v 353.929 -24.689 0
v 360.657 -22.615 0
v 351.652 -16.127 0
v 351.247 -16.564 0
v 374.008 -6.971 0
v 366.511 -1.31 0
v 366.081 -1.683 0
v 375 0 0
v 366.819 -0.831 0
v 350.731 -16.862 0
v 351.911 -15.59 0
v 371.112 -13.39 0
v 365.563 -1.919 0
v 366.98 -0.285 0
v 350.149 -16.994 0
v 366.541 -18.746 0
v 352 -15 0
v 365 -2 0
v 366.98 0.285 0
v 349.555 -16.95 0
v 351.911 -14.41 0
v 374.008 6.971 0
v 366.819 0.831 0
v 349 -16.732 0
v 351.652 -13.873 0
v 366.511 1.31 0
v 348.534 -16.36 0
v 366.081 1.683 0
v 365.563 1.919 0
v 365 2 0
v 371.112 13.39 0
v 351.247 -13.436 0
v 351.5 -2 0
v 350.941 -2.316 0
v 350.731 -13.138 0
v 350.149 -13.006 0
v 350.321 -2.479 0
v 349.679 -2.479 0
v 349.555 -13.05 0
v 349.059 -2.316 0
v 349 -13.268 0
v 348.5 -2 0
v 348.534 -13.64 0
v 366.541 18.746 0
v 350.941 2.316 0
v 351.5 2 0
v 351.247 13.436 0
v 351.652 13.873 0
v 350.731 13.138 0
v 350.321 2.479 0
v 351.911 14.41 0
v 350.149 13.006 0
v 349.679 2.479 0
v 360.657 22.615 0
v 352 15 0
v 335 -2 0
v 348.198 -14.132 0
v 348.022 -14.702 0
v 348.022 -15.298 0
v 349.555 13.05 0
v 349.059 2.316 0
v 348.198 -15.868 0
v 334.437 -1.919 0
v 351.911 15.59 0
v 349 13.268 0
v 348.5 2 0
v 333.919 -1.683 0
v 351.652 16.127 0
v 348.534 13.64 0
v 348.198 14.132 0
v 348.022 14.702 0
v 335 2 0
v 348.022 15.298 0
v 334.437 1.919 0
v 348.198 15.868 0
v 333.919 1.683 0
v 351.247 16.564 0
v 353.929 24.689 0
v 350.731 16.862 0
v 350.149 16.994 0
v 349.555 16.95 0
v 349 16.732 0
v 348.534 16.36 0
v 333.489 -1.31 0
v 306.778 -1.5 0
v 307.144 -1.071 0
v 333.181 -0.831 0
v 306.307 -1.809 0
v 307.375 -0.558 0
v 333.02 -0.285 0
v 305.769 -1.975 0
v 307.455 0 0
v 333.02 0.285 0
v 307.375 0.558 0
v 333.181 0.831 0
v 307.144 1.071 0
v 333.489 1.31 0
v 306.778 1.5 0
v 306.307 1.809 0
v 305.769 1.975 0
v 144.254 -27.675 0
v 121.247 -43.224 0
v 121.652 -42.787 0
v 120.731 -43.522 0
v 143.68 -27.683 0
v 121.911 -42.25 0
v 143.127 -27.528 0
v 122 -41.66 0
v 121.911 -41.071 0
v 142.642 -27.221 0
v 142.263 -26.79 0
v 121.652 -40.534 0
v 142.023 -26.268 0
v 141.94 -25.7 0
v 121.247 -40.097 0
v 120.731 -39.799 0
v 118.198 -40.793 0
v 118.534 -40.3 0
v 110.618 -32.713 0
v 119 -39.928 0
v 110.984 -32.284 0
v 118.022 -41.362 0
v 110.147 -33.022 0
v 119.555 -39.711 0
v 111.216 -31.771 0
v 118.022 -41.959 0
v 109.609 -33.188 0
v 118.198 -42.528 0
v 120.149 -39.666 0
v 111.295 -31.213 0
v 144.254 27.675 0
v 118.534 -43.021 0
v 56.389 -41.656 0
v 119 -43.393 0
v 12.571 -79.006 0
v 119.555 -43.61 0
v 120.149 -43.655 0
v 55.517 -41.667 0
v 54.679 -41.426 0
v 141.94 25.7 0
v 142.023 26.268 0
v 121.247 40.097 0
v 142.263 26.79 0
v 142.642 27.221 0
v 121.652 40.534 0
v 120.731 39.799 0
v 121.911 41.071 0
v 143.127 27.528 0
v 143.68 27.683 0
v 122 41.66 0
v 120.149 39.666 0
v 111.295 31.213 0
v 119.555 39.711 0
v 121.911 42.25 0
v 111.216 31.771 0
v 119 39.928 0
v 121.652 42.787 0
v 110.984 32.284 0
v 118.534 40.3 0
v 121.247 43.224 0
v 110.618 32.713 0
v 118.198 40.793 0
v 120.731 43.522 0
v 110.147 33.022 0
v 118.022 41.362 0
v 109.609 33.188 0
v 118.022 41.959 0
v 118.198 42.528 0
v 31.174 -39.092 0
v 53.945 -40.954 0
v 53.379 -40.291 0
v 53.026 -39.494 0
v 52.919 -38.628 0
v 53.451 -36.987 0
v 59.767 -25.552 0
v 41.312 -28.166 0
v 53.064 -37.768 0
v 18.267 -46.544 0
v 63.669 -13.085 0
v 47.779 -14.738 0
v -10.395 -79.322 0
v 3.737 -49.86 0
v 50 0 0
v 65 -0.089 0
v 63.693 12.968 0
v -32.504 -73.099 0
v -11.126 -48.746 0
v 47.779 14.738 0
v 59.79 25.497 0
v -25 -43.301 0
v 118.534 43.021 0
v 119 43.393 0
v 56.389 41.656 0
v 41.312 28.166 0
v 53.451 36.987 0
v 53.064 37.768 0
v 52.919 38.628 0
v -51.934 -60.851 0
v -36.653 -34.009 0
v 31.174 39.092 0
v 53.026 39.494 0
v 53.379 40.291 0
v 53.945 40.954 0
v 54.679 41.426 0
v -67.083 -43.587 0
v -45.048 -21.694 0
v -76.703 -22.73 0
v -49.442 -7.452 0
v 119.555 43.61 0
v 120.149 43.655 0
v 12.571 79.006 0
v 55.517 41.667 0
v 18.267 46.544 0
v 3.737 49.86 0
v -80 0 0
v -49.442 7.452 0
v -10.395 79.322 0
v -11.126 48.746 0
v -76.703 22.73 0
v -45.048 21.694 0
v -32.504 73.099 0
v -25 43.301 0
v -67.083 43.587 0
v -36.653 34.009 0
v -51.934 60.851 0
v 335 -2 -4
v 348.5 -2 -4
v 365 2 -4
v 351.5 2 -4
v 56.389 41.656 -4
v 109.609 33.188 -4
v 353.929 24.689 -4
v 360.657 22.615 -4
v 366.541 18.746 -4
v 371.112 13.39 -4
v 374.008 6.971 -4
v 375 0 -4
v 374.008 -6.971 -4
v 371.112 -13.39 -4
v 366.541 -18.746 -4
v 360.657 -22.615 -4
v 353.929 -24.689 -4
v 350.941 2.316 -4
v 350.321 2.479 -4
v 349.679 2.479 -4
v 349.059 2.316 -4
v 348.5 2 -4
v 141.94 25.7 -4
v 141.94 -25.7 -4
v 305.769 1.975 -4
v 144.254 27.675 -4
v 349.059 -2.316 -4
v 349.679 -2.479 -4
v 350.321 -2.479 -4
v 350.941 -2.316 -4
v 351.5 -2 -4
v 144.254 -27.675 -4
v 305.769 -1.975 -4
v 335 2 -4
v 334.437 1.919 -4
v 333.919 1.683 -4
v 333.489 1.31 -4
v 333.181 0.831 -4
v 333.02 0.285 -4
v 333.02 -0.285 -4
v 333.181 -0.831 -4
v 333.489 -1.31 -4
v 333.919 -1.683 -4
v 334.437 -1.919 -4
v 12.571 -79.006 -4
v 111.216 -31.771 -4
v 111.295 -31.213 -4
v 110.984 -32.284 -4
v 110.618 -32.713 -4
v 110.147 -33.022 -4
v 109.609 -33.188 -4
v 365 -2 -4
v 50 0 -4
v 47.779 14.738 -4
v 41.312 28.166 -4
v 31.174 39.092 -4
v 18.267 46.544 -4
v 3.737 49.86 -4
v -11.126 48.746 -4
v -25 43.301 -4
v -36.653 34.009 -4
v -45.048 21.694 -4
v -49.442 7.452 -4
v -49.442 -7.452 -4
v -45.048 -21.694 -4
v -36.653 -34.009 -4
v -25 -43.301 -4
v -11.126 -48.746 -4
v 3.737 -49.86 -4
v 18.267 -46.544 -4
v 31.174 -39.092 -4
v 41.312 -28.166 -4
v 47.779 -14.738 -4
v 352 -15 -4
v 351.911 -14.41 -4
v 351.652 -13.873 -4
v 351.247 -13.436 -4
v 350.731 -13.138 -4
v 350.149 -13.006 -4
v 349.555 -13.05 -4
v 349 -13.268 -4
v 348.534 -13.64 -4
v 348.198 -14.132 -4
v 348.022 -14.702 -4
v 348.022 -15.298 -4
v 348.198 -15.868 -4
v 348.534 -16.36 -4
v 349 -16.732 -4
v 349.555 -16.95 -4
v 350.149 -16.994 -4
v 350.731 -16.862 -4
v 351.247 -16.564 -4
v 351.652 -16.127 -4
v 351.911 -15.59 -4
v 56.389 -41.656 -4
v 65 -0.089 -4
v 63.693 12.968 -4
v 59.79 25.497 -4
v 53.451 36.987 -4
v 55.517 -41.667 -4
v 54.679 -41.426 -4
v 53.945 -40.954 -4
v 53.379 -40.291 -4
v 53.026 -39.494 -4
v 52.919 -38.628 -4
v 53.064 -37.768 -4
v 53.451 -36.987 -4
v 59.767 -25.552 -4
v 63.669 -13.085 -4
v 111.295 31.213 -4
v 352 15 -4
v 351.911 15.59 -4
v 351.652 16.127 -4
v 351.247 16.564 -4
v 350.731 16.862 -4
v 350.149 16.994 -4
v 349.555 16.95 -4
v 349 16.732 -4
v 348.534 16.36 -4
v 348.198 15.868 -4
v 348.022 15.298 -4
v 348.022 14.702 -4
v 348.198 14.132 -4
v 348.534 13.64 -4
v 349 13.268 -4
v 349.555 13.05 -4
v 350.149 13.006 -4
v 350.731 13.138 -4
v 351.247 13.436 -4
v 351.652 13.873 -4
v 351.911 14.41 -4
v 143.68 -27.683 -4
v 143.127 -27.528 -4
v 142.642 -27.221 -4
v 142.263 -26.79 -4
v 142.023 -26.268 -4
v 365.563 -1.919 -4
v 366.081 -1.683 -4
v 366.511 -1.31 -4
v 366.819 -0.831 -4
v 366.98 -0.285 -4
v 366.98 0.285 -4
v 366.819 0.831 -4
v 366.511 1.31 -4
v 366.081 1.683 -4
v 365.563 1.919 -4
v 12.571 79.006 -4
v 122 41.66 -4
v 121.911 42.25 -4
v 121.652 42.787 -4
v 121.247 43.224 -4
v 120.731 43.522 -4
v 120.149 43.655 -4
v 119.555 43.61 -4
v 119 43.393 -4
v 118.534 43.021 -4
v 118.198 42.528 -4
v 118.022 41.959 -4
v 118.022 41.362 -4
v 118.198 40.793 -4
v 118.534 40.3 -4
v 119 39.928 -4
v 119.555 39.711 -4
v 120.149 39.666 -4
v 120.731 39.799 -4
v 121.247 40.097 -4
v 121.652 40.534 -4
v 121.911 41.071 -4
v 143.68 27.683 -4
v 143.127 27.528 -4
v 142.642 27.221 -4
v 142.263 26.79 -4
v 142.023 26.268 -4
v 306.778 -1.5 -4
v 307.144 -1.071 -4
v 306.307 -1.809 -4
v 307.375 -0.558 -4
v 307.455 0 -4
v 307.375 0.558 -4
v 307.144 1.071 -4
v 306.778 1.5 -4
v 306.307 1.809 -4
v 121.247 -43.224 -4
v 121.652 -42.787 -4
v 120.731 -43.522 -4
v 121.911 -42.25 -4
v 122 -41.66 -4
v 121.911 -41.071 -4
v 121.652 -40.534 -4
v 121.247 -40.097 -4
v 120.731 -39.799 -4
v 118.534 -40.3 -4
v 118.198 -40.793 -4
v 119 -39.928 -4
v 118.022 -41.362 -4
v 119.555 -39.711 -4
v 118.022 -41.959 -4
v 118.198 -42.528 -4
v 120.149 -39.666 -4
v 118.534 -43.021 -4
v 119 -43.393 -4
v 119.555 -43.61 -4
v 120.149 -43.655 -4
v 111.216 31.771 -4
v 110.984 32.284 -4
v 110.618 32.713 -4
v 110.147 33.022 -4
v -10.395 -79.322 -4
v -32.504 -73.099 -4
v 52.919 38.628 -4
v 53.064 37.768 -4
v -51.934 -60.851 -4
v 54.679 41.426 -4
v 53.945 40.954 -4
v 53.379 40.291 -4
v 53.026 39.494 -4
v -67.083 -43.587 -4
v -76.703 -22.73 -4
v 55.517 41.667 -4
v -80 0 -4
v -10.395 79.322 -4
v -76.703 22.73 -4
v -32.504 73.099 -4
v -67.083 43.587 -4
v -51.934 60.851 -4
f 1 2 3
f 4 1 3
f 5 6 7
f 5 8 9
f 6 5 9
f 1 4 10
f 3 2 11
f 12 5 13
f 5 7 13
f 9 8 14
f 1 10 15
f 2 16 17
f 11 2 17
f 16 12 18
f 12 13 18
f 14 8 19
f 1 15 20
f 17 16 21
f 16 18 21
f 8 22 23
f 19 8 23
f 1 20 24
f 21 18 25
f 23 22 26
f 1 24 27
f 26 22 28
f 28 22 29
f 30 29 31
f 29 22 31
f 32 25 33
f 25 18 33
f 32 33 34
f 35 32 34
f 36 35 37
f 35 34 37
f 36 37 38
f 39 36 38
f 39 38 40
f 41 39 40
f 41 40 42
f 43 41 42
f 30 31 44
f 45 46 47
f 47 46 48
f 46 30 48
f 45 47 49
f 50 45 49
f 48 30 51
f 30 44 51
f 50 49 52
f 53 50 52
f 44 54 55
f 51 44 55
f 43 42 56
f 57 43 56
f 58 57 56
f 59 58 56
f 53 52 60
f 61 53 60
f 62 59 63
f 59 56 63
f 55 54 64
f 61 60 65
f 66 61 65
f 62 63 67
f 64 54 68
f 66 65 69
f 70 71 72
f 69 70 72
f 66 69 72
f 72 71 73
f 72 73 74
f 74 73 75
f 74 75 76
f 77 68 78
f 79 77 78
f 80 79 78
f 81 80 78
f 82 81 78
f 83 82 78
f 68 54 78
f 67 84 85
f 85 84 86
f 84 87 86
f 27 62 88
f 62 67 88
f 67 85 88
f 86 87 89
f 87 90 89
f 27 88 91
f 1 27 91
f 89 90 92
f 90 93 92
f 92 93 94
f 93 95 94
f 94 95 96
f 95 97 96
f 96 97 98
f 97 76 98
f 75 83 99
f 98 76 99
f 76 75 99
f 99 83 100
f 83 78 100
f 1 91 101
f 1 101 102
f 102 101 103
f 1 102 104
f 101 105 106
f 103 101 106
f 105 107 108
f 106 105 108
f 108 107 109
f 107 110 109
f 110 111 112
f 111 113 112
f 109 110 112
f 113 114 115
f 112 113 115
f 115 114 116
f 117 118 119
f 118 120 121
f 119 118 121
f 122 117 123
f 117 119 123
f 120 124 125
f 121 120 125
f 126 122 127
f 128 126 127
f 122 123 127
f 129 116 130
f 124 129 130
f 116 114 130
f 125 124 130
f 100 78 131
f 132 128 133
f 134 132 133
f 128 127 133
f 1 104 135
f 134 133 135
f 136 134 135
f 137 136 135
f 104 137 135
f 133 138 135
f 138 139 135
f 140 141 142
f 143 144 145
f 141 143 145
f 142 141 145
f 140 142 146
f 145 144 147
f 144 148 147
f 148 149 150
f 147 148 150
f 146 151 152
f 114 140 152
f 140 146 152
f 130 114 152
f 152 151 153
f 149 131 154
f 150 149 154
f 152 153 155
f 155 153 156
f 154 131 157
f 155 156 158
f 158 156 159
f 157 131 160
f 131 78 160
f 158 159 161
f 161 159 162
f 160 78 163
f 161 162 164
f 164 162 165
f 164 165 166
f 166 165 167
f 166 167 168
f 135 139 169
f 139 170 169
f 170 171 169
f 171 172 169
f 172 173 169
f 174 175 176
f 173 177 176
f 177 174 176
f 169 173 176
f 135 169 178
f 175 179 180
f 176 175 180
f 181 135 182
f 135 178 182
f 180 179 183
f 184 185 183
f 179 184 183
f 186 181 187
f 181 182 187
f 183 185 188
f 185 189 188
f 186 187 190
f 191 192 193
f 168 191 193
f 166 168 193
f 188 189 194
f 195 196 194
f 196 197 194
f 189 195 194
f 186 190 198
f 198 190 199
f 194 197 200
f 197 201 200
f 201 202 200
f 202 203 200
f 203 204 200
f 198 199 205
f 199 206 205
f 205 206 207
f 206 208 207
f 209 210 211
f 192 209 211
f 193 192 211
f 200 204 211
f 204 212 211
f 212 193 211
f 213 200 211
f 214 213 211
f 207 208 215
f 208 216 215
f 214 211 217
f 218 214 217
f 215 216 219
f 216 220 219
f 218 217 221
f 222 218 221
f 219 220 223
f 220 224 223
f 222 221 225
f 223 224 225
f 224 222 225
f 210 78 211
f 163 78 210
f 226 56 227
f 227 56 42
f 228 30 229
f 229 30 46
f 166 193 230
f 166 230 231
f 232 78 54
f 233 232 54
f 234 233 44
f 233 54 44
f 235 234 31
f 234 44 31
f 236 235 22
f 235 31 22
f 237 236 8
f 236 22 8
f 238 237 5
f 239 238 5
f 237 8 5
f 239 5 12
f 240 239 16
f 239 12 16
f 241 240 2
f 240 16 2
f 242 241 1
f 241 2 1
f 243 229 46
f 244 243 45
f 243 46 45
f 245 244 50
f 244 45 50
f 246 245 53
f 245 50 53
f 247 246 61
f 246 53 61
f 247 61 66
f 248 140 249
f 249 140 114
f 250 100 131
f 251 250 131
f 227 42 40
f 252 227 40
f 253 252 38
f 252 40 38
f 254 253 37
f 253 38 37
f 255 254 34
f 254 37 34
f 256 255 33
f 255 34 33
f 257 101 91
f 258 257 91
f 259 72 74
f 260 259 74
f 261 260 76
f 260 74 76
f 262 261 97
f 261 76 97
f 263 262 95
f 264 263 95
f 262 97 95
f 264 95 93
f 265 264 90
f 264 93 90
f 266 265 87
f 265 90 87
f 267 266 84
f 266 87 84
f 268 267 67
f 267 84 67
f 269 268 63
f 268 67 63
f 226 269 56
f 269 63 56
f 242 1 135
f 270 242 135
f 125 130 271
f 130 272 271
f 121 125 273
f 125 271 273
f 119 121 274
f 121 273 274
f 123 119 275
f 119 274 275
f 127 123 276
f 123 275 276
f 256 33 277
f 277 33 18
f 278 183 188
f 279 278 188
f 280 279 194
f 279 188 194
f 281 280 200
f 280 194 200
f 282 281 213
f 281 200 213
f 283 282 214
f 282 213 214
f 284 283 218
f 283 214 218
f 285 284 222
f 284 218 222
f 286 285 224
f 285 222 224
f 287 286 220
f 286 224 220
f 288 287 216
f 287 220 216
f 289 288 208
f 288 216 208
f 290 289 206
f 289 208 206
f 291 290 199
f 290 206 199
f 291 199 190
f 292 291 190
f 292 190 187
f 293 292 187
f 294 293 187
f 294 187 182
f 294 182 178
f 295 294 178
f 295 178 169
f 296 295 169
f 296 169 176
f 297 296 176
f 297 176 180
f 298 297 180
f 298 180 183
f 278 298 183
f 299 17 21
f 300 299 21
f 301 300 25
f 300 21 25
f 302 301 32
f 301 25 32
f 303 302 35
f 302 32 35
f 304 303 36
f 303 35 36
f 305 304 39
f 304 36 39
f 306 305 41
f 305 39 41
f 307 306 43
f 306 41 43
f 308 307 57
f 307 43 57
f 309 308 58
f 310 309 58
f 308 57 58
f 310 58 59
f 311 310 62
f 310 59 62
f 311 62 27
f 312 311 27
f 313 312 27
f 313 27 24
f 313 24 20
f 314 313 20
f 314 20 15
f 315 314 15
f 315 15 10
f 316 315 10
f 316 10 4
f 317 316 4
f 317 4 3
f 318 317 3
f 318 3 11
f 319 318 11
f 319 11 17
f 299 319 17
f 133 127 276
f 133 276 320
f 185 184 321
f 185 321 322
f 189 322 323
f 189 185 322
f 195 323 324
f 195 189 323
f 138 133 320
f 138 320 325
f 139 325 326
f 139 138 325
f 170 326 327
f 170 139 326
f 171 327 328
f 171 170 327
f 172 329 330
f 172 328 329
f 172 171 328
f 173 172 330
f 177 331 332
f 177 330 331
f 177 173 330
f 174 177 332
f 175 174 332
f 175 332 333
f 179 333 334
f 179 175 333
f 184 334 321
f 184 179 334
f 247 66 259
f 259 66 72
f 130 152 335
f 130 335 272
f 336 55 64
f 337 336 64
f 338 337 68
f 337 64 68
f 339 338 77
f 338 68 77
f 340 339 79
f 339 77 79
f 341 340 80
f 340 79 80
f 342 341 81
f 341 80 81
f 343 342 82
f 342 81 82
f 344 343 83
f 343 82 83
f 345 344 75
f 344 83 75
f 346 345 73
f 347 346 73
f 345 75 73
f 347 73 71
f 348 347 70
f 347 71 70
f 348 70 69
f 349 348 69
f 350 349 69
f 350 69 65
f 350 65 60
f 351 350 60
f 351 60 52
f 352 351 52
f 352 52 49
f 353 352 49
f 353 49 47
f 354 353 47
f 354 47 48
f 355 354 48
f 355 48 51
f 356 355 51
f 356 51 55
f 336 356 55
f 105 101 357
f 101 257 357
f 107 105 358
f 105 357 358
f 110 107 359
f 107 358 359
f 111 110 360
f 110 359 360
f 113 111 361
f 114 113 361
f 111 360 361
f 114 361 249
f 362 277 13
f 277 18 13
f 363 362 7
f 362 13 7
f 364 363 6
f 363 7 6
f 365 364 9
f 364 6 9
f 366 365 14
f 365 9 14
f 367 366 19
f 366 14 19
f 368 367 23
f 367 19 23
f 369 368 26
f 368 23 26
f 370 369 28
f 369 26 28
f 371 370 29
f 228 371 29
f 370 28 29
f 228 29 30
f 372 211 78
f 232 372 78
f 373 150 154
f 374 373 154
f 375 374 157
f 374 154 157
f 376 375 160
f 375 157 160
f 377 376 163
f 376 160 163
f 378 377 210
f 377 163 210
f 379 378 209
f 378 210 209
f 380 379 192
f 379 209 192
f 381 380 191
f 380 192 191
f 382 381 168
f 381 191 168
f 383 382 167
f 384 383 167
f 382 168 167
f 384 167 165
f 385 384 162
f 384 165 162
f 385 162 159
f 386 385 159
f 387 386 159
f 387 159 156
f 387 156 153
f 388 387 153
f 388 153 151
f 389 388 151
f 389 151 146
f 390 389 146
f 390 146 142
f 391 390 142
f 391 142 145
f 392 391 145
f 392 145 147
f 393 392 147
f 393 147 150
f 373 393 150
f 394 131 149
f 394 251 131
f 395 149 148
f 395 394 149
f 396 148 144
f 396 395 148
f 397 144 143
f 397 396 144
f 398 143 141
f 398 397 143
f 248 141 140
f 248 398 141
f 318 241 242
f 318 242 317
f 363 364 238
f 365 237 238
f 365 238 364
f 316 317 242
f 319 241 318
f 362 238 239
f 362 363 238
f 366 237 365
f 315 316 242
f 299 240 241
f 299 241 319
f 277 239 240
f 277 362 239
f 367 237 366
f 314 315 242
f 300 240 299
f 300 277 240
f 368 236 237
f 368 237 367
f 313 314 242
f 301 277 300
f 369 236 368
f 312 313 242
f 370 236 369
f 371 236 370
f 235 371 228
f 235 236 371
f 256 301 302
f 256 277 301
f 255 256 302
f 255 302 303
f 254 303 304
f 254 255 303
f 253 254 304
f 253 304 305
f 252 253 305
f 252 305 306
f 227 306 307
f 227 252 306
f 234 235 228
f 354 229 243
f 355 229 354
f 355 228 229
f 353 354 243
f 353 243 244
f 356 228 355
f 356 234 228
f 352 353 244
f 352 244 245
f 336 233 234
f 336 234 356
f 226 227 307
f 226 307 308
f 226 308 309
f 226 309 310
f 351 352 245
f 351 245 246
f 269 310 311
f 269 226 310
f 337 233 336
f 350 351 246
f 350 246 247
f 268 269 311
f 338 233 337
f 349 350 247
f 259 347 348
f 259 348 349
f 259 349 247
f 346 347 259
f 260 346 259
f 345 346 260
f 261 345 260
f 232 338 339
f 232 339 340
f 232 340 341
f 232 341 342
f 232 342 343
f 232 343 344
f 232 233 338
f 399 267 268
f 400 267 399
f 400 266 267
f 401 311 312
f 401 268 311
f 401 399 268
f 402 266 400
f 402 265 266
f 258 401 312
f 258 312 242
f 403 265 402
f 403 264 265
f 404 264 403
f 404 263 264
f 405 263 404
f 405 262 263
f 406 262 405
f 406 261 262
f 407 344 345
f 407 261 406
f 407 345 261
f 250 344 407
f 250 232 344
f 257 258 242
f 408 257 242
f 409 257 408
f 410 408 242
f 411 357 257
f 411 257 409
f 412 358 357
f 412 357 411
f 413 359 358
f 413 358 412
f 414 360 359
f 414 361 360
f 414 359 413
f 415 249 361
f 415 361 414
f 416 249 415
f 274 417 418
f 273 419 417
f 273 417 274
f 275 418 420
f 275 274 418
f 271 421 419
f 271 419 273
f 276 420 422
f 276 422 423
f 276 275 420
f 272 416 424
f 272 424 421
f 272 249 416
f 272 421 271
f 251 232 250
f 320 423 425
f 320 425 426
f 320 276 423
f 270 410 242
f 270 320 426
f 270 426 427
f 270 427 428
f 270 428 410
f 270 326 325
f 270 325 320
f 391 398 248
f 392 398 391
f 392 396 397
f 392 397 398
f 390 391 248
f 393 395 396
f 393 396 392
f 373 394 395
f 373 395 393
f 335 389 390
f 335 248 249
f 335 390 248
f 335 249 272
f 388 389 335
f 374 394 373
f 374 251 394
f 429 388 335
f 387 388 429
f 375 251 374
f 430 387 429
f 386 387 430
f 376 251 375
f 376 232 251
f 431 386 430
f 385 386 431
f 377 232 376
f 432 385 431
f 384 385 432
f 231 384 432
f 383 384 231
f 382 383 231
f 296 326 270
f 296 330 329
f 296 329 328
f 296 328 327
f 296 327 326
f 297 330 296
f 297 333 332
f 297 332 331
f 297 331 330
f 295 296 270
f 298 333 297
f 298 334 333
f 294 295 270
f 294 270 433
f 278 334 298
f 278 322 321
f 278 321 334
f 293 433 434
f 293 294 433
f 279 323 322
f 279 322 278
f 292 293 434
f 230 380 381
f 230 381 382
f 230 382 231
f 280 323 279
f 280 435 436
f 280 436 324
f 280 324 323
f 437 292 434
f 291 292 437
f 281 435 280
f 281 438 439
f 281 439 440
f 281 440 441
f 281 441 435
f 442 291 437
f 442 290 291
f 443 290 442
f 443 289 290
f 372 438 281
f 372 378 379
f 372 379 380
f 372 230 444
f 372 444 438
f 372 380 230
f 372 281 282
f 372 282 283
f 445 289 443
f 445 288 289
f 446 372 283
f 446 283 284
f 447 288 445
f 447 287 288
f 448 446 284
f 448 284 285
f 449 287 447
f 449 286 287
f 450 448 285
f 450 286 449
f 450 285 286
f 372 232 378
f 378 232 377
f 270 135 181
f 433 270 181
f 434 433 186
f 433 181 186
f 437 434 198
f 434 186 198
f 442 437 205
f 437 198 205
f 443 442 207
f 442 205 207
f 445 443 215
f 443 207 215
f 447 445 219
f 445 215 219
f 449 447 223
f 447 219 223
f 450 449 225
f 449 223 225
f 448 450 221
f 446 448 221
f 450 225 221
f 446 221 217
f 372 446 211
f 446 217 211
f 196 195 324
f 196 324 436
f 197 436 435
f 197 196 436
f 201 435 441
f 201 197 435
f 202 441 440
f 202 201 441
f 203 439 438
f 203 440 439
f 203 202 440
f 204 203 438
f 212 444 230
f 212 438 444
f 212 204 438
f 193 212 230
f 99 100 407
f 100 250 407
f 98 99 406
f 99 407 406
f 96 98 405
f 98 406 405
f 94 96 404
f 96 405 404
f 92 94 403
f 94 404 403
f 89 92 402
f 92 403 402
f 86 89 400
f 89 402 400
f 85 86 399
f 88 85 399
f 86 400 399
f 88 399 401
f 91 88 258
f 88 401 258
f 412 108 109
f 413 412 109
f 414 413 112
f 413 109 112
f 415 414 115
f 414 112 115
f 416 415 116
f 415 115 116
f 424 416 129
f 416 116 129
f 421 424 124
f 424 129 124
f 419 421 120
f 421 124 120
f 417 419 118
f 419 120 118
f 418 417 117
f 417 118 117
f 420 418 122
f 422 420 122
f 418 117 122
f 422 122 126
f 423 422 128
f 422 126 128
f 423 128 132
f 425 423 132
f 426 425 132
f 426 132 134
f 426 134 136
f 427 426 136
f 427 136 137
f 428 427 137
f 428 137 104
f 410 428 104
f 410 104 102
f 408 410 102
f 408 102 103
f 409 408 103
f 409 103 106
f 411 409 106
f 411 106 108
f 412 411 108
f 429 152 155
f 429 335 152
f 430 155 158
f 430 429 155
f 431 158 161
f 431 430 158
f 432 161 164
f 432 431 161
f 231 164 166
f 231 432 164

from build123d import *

# Parameters (mm, degrees)
SM_BASE_FLANGE_1_DEPTH = 4
SKETCH_6_R             = 20
SKETCH_6_R_2           = 2.5
CUT_EXTRUDE_1_DEPTH    = 10
SKETCH_7_R             = 2
CUT_EXTRUDE_2_DEPTH    = 10
CUT_EXTRUDE_3_DEPTH    = 10
SKETCH_9_R             = 2
CUT_EXTRUDE_4_DEPTH    = 80
FILLET_2_R             = 2
SKETCH_10_R            = 50
CUT_EXTRUDE_5_DEPTH    = 10


# Sheet-metal steps are written as plain solids
with BuildPart() as part:
    # Sketch 1 → 基体-法兰1 (new body)
    with BuildSketch(Plane.XY):
        with BuildLine():
            Line((12.571428571, 79.00607055), (353.928571429, 24.689397047))
            ThreePointArc((353.928571429, 24.689397047), (375, 0), (353.928571429, -24.689397047))
            Line((353.928571429, -24.689397047), (12.571428571, -79.00607055))
            ThreePointArc((12.571428571, -79.00607055), (-80, 0), (12.571428571, 79.00607055))
        make_face()
    extrude(amount=-SM_BASE_FLANGE_1_DEPTH)

    # 草图6 → 切除-拉伸1 (cut)
    with BuildSketch(Plane.XY):
        Circle(SKETCH_6_R)
        with Locations((350, 0)):
            Circle(SKETCH_6_R_2)
    extrude(amount=-CUT_EXTRUDE_1_DEPTH, mode=Mode.SUBTRACT)

    # 草图7 → 切除-拉伸2 (cut)
    with BuildSketch(Plane.XY):
        with Locations((365, 0)):
            Circle(SKETCH_7_R)
        with Locations((350, -15)):
            Circle(SKETCH_7_R)
        with Locations((335, 0)):
            Circle(SKETCH_7_R)
        with Locations((350, 15)):
            Circle(SKETCH_7_R)
        with BuildLine():
            Line((111.294862901, 32.919806827), (111.294862901, -32.919806827))
            Line((111.294862901, -32.919806827), (56.389238276, -41.656377743))
            ThreePointArc((56.389238276, -41.656377743), (53.378656764, -40.291367953), (53.450847511, -36.986577299))
            ThreePointArc((53.450847511, -36.986577299), (62.032293151, -19.416348946), (64.999939097, -0.088979461))
            ThreePointArc((64.999939097, -0.088979461), (62.058814357, 19.33141383), (53.450847511, 36.986577299))
            ThreePointArc((53.450847511, 36.986577299), (53.378656764, 40.291367953), (56.389238276, 41.656377743))
            Line((56.389238276, 41.656377743), (111.294862901, 32.919806827))
        make_face()
        Polygon((141.940088648, 28.043545246), (141.940088648, -28.043545246), (318.181818182, 0), align=None)
    extrude(amount=-CUT_EXTRUDE_2_DEPTH, mode=Mode.SUBTRACT)

    # 草图8 → 切除-拉伸3 (cut)
    with BuildSketch(Plane.XY):
        with BuildLine():
            Line((347.5, 0), (337, 0))
            ThreePointArc((337, 0), (336.414213562, -1.414213562), (335, -2))
            Line((335, -2), (348.5, -2))
            ThreePointArc((348.5, -2), (347.763932023, -1.118033989), (347.5, 0))
        make_face()
        with BuildLine():
            ThreePointArc((335, 2), (336.414213562, 1.414213562), (337, 0))
            Line((337, 0), (347.5, 0))
            ThreePointArc((347.5, 0), (347.763932023, 1.118033989), (348.5, 2))
            Line((348.5, 2), (335, 2))
        make_face()
        with BuildLine():
            ThreePointArc((351.5, 2), (352.236067977, 1.118033989), (352.5, 0))
            Line((352.5, 0), (363, 0))
            ThreePointArc((363, 0), (363.585786438, 1.414213562), (365, 2))
            Line((365, 2), (351.5, 2))
        make_face()
        with BuildLine():
            Line((363, 0), (352.5, 0))
            ThreePointArc((352.5, 0), (352.236067977, -1.118033989), (351.5, -2))
            Line((351.5, -2), (365, -2))
            ThreePointArc((365, -2), (363.585786438, -1.414213562), (363, 0))
        make_face()
    extrude(amount=-CUT_EXTRUDE_3_DEPTH, mode=Mode.SUBTRACT)

    # 草图9 → 切除-拉伸4 (cut)
    with BuildSketch(Plane.XY):
        with Locations((120, 41.660451514)):
            Circle(SKETCH_9_R)
        with Locations((120, -41.660451514)):
            Circle(SKETCH_9_R)
    extrude(amount=-CUT_EXTRUDE_4_DEPTH, mode=Mode.SUBTRACT)

    # 圆角2
    fillet_2_edges = [part.edges().sort_by_distance(p)[0] for p in [
        (141.940088648, 28.043545246, -2),
        (318.181818182, 0, -2),
        (141.940088648, -28.043545246, -2),
        (111.294862901, 32.919806827, -2),
        (111.294862901, -32.919806827, -2),
    ]]
    fillet(fillet_2_edges, radius=FILLET_2_R)

    # 草图10 → 切除-拉伸5 (cut)
    with BuildSketch(Plane.XY):
        Circle(SKETCH_10_R)
    extrude(amount=-CUT_EXTRUDE_5_DEPTH, mode=Mode.SUBTRACT)


solid = part.part
